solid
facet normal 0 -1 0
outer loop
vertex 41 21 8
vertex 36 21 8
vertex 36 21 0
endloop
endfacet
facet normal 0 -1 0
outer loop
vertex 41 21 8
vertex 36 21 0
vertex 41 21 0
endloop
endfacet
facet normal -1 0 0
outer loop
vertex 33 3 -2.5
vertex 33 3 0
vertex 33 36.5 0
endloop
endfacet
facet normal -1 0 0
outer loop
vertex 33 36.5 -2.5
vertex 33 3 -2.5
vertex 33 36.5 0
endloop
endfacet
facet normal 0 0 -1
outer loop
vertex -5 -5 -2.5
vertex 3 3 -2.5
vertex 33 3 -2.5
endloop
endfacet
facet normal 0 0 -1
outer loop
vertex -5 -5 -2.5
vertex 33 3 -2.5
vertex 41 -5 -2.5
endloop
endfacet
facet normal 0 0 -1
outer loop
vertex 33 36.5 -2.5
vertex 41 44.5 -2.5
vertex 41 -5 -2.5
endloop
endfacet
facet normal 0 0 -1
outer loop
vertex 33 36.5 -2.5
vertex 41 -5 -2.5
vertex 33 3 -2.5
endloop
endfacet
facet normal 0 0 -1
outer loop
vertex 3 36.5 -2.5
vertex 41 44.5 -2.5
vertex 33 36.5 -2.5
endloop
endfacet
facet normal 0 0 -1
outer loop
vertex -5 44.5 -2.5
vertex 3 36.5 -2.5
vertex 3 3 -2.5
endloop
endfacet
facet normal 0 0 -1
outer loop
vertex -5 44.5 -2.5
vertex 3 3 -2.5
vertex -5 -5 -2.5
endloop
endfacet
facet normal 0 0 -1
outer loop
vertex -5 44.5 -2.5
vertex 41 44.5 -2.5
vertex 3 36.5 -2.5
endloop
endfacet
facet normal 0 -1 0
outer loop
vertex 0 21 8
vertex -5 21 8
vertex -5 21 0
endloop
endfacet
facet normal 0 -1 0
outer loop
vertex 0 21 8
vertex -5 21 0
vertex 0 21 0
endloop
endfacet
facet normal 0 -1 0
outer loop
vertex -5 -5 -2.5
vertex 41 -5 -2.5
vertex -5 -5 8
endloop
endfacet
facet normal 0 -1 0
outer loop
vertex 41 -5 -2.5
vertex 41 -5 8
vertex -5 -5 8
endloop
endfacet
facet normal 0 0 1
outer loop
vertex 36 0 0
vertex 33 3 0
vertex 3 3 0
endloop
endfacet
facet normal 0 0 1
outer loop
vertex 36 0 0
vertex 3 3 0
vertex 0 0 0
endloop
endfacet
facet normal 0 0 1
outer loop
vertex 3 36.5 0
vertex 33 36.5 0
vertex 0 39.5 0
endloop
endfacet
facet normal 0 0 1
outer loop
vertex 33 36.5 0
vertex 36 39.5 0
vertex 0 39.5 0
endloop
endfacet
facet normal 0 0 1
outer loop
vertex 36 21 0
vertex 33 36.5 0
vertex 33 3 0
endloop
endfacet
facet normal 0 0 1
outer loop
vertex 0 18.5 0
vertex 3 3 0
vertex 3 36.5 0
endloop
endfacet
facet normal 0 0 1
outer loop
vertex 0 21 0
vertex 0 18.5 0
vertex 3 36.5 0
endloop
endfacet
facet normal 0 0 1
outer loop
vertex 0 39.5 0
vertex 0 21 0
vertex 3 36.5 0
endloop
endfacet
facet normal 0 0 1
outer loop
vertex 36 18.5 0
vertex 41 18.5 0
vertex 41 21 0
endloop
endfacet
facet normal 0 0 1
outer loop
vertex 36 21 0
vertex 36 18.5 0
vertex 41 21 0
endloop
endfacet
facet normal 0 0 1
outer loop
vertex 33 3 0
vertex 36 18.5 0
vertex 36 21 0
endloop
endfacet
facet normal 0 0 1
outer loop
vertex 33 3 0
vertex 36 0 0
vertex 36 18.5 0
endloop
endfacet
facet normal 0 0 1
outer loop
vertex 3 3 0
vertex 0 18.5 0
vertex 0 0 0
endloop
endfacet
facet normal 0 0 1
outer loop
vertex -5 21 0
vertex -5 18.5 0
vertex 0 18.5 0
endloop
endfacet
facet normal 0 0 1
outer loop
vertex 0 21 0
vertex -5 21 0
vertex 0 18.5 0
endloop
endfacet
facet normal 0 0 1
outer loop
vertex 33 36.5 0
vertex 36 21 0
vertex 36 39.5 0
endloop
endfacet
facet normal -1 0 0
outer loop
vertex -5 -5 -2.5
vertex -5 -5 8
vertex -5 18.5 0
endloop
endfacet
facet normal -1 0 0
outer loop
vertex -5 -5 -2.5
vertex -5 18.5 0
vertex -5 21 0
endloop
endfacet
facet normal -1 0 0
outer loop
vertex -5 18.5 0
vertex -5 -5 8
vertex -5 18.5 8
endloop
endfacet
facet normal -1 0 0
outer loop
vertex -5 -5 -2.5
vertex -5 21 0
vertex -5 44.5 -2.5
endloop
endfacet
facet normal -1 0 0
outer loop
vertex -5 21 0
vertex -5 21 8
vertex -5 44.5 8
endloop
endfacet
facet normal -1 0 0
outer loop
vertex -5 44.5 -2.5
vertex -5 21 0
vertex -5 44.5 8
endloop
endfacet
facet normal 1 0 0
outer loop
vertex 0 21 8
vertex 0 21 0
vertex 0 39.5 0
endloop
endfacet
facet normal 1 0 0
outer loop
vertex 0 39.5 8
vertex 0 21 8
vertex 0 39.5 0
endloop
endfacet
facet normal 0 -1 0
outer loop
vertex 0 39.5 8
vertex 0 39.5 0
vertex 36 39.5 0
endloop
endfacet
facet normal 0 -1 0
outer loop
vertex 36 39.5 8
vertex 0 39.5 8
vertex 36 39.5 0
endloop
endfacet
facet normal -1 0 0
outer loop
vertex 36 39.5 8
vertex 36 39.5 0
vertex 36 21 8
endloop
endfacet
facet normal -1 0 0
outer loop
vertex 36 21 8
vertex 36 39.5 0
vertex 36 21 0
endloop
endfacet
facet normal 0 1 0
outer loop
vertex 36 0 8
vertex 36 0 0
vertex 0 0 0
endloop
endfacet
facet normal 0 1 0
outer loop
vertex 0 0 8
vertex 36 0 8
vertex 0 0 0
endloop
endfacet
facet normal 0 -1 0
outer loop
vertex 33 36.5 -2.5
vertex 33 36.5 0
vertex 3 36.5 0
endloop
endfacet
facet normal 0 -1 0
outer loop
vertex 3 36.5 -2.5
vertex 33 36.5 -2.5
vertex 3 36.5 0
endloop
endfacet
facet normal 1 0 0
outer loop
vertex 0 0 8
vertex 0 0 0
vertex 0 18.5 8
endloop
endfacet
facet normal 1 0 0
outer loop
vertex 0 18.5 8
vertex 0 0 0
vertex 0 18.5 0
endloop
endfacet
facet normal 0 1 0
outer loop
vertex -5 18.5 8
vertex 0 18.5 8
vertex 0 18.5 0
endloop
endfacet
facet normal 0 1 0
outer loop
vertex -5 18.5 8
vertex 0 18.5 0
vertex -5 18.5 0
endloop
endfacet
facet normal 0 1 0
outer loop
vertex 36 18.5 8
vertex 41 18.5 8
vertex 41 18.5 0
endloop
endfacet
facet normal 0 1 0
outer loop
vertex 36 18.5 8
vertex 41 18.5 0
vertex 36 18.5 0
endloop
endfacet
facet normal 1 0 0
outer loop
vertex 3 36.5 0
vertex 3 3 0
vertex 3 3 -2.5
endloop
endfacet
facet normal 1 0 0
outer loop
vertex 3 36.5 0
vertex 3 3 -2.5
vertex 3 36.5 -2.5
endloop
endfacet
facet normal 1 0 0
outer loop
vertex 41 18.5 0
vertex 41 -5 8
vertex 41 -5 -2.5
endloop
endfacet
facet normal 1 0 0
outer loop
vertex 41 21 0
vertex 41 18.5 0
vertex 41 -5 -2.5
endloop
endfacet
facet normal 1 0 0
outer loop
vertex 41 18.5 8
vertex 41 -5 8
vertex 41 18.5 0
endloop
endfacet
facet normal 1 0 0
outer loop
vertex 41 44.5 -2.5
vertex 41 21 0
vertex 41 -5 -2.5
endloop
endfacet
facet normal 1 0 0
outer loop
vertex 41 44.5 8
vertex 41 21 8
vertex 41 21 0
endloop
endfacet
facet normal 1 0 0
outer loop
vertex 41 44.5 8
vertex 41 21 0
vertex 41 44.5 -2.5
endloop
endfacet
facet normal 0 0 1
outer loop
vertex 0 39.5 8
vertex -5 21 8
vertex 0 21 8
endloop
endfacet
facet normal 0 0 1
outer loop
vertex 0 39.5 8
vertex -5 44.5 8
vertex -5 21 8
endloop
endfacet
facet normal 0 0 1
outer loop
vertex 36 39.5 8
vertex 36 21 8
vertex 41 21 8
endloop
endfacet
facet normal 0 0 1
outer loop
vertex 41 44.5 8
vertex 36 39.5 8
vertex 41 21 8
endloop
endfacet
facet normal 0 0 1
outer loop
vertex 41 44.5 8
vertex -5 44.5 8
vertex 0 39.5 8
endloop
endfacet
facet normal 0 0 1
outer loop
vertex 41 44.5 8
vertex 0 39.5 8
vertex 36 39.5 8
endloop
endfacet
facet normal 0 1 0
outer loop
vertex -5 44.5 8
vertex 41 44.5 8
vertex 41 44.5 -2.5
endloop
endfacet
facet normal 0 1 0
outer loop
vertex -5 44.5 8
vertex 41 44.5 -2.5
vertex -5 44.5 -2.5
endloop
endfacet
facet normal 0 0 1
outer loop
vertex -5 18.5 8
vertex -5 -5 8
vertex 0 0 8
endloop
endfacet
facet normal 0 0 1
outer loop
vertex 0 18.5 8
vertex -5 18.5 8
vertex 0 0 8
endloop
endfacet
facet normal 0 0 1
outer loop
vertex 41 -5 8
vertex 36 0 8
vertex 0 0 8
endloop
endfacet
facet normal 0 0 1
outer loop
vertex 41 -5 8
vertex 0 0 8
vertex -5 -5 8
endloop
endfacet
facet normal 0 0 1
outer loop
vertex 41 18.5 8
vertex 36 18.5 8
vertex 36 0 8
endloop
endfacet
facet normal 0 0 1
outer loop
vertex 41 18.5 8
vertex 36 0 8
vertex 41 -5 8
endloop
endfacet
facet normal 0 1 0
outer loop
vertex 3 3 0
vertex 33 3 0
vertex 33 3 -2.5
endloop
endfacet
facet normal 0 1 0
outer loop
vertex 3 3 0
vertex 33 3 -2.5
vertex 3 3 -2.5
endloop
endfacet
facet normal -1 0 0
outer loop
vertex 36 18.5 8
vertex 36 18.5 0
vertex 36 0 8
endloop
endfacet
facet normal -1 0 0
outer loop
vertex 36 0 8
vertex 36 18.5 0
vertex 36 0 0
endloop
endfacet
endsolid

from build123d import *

# Parameters (mm, degrees)
BOSS_EXTRUDE1_DEPTH   = 8
BOSS_EXTRUDE1_2_DEPTH = 8
SKETCH2_W             = 46
SKETCH2_H             = 49.5
SKETCH2_W_2           = 30
SKETCH2_H_2           = 33.5
BOSS_EXTRUDE2_DEPTH   = 2.5


with BuildPart() as part:
    # Sketch1 → Boss-Extrude1 (new body)
    with BuildSketch(Plane.XY):
        Polygon((-5, 21), (0, 21), (0, 39.5), (36, 39.5), (36, 21), (41, 21), (41, 44.5), (-5, 44.5), align=None)
    extrude(amount=BOSS_EXTRUDE1_DEPTH)



with BuildPart() as body_2:
    # Sketch1 → Boss-Extrude1 2 (new body)
    with BuildSketch(Plane.XY):
        Polygon((36, 0), (0, 0), (0, 18.5), (-5, 18.5), (-5, -5), (41, -5), (41, 18.5), (36, 18.5), align=None)
    extrude(amount=BOSS_EXTRUDE1_2_DEPTH)


with BuildPart() as part_1:
    add(part.part)

    add(body_2.part)  # Boss-Extrude2 merges body 2
    # Sketch2 → Boss-Extrude2 (add)
    with BuildSketch(Plane(origin=(0, 0, 0), x_dir=(-1, 0, 0), z_dir=(0, 0, -1))):
        with Locations((-18, 19.75)):
            Rectangle(SKETCH2_W, SKETCH2_H)
        with Locations((-18, 19.75)):
            Rectangle(SKETCH2_W_2, SKETCH2_H_2, mode=Mode.SUBTRACT)
    extrude(amount=BOSS_EXTRUDE2_DEPTH)


solid = part_1.part
